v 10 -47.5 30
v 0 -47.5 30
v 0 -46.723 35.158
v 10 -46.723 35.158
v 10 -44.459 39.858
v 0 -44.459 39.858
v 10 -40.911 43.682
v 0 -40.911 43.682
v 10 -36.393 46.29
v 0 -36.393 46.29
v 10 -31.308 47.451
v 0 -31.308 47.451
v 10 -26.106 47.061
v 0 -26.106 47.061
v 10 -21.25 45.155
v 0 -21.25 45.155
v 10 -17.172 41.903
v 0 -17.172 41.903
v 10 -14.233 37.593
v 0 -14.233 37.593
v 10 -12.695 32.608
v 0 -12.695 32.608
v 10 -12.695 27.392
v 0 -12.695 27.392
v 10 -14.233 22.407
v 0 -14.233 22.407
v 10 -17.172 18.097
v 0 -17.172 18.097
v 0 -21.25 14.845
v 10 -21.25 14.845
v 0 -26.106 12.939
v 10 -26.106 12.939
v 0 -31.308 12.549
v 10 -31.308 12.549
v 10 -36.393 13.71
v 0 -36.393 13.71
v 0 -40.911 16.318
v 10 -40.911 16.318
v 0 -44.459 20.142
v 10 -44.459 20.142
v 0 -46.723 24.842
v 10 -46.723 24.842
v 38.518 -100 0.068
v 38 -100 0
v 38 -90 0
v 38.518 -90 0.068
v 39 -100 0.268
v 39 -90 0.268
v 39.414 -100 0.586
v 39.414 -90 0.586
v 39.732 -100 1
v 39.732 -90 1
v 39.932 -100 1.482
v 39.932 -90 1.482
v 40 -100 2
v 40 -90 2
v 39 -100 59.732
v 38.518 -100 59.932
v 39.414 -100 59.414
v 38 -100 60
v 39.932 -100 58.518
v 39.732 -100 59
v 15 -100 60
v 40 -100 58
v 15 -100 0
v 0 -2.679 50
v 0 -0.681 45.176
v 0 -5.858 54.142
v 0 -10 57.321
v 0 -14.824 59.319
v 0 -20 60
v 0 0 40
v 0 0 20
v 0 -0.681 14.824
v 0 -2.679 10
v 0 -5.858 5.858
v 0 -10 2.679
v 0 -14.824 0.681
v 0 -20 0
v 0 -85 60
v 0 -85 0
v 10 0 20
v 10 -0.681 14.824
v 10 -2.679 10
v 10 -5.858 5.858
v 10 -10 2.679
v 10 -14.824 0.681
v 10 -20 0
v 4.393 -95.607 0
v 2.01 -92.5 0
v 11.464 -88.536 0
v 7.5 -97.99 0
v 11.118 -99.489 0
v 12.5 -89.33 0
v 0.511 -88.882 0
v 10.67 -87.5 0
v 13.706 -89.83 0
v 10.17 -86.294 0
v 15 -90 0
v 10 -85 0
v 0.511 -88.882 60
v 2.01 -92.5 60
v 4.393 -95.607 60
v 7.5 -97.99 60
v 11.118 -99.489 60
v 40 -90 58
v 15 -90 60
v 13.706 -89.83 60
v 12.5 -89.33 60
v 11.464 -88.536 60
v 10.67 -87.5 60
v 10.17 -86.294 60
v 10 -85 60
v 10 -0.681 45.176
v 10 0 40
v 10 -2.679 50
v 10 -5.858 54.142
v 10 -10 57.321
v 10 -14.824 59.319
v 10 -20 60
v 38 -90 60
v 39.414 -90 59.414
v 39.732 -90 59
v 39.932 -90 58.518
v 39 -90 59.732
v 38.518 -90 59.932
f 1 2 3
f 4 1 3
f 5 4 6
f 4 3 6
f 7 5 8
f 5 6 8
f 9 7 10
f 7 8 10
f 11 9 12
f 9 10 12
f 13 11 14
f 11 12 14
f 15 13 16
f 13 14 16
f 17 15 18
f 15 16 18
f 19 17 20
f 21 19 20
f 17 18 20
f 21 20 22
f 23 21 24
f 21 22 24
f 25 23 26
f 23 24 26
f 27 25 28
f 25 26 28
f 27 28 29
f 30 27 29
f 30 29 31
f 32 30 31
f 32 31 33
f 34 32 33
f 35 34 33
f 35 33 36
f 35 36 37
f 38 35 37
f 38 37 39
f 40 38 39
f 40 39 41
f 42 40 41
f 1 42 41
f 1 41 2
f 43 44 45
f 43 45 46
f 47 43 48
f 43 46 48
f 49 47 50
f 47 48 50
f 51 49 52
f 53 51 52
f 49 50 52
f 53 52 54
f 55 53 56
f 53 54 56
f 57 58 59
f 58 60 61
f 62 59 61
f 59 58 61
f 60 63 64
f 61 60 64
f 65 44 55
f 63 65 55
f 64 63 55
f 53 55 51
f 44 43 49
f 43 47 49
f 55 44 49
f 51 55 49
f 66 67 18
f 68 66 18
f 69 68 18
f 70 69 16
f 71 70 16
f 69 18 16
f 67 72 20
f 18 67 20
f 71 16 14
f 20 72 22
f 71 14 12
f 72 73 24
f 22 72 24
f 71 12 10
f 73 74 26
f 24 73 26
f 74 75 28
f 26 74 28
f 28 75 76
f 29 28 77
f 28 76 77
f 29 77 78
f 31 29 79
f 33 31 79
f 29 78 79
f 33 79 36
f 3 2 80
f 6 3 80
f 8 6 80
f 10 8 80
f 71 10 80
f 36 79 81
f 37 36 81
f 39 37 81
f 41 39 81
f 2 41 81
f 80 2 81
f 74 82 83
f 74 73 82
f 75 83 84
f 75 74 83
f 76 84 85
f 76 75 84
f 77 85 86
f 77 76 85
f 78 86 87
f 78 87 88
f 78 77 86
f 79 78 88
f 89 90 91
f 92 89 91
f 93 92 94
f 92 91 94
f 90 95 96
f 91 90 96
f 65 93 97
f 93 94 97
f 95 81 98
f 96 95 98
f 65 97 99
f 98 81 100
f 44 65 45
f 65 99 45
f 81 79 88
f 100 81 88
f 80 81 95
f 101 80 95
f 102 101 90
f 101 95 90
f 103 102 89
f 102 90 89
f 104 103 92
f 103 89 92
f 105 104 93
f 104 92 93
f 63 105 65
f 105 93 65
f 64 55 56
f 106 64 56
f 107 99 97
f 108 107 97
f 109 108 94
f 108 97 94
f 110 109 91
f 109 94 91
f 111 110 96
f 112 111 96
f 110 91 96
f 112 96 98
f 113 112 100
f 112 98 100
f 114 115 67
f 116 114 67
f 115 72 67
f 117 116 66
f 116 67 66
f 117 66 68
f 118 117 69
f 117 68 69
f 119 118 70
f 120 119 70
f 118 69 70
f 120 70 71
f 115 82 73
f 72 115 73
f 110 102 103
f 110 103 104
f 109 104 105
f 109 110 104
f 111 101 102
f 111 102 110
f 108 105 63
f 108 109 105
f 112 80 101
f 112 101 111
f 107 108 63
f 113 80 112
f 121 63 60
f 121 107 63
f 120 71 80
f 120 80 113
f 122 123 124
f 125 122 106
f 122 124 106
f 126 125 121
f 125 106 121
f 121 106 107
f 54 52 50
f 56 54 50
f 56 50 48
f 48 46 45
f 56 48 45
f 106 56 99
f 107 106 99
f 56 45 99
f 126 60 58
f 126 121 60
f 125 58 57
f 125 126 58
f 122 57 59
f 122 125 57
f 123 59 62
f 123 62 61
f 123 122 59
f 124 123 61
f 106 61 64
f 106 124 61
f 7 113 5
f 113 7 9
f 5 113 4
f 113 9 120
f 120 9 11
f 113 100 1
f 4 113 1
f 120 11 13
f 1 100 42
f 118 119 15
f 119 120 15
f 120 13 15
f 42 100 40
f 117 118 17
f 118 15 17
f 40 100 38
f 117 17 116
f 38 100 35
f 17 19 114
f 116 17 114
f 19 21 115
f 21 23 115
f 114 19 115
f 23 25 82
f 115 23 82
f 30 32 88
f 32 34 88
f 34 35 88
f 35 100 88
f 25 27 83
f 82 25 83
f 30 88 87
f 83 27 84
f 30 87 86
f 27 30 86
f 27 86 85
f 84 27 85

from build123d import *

# Parameters (mm, degrees)
TABAN_FLAN_2_DEPTH    = 60
RADYUS1_R             = 20
RADYUS2_R             = 2
IZIM10_R              = 17.5
KES_EKSTR_ZYON1_DEPTH = 30


# Sheet-metal steps are written as plain solids
with BuildPart() as part:
    # Çizim1 → Taban-Flanş2 (new body)
    with BuildSketch(Plane.XY):
        with BuildLine():
            Line((0, 0), (0, -85))
            ThreePointArc((0, -85), (4.393398282, -95.606601718), (15, -100))
            Line((15, -100), (40, -100))
            Line((40, -100), (40, -90))
            Line((40, -90), (15, -90))
            ThreePointArc((15, -90), (11.464466094, -88.535533906), (10, -85))
            Line((10, -85), (10, 0))
            Line((10, 0), (0, 0))
        make_face()
    extrude(amount=TABAN_FLAN_2_DEPTH)

    # Radyus1
    radyus1_edges = [part.edges().sort_by_distance(p)[0] for p in [
        (5, 0, 0),
        (5, 0, 60),
    ]]
    fillet(radyus1_edges, radius=RADYUS1_R)

    # Radyus2
    radyus2_edges = [part.edges().sort_by_distance(p)[0] for p in [
        (40, -95, 0),
        (40, -95, 60),
    ]]
    fillet(radyus2_edges, radius=RADYUS2_R)

    # Çizim10 → Kes-Ekstrüzyon1 (cut)
    with BuildSketch(Plane.ZY):
        with Locations(Location((30, -30, 0), (0, 0, 270))):
            Circle(IZIM10_R)
    extrude(amount=-KES_EKSTR_ZYON1_DEPTH, mode=Mode.SUBTRACT)


solid = part.part
